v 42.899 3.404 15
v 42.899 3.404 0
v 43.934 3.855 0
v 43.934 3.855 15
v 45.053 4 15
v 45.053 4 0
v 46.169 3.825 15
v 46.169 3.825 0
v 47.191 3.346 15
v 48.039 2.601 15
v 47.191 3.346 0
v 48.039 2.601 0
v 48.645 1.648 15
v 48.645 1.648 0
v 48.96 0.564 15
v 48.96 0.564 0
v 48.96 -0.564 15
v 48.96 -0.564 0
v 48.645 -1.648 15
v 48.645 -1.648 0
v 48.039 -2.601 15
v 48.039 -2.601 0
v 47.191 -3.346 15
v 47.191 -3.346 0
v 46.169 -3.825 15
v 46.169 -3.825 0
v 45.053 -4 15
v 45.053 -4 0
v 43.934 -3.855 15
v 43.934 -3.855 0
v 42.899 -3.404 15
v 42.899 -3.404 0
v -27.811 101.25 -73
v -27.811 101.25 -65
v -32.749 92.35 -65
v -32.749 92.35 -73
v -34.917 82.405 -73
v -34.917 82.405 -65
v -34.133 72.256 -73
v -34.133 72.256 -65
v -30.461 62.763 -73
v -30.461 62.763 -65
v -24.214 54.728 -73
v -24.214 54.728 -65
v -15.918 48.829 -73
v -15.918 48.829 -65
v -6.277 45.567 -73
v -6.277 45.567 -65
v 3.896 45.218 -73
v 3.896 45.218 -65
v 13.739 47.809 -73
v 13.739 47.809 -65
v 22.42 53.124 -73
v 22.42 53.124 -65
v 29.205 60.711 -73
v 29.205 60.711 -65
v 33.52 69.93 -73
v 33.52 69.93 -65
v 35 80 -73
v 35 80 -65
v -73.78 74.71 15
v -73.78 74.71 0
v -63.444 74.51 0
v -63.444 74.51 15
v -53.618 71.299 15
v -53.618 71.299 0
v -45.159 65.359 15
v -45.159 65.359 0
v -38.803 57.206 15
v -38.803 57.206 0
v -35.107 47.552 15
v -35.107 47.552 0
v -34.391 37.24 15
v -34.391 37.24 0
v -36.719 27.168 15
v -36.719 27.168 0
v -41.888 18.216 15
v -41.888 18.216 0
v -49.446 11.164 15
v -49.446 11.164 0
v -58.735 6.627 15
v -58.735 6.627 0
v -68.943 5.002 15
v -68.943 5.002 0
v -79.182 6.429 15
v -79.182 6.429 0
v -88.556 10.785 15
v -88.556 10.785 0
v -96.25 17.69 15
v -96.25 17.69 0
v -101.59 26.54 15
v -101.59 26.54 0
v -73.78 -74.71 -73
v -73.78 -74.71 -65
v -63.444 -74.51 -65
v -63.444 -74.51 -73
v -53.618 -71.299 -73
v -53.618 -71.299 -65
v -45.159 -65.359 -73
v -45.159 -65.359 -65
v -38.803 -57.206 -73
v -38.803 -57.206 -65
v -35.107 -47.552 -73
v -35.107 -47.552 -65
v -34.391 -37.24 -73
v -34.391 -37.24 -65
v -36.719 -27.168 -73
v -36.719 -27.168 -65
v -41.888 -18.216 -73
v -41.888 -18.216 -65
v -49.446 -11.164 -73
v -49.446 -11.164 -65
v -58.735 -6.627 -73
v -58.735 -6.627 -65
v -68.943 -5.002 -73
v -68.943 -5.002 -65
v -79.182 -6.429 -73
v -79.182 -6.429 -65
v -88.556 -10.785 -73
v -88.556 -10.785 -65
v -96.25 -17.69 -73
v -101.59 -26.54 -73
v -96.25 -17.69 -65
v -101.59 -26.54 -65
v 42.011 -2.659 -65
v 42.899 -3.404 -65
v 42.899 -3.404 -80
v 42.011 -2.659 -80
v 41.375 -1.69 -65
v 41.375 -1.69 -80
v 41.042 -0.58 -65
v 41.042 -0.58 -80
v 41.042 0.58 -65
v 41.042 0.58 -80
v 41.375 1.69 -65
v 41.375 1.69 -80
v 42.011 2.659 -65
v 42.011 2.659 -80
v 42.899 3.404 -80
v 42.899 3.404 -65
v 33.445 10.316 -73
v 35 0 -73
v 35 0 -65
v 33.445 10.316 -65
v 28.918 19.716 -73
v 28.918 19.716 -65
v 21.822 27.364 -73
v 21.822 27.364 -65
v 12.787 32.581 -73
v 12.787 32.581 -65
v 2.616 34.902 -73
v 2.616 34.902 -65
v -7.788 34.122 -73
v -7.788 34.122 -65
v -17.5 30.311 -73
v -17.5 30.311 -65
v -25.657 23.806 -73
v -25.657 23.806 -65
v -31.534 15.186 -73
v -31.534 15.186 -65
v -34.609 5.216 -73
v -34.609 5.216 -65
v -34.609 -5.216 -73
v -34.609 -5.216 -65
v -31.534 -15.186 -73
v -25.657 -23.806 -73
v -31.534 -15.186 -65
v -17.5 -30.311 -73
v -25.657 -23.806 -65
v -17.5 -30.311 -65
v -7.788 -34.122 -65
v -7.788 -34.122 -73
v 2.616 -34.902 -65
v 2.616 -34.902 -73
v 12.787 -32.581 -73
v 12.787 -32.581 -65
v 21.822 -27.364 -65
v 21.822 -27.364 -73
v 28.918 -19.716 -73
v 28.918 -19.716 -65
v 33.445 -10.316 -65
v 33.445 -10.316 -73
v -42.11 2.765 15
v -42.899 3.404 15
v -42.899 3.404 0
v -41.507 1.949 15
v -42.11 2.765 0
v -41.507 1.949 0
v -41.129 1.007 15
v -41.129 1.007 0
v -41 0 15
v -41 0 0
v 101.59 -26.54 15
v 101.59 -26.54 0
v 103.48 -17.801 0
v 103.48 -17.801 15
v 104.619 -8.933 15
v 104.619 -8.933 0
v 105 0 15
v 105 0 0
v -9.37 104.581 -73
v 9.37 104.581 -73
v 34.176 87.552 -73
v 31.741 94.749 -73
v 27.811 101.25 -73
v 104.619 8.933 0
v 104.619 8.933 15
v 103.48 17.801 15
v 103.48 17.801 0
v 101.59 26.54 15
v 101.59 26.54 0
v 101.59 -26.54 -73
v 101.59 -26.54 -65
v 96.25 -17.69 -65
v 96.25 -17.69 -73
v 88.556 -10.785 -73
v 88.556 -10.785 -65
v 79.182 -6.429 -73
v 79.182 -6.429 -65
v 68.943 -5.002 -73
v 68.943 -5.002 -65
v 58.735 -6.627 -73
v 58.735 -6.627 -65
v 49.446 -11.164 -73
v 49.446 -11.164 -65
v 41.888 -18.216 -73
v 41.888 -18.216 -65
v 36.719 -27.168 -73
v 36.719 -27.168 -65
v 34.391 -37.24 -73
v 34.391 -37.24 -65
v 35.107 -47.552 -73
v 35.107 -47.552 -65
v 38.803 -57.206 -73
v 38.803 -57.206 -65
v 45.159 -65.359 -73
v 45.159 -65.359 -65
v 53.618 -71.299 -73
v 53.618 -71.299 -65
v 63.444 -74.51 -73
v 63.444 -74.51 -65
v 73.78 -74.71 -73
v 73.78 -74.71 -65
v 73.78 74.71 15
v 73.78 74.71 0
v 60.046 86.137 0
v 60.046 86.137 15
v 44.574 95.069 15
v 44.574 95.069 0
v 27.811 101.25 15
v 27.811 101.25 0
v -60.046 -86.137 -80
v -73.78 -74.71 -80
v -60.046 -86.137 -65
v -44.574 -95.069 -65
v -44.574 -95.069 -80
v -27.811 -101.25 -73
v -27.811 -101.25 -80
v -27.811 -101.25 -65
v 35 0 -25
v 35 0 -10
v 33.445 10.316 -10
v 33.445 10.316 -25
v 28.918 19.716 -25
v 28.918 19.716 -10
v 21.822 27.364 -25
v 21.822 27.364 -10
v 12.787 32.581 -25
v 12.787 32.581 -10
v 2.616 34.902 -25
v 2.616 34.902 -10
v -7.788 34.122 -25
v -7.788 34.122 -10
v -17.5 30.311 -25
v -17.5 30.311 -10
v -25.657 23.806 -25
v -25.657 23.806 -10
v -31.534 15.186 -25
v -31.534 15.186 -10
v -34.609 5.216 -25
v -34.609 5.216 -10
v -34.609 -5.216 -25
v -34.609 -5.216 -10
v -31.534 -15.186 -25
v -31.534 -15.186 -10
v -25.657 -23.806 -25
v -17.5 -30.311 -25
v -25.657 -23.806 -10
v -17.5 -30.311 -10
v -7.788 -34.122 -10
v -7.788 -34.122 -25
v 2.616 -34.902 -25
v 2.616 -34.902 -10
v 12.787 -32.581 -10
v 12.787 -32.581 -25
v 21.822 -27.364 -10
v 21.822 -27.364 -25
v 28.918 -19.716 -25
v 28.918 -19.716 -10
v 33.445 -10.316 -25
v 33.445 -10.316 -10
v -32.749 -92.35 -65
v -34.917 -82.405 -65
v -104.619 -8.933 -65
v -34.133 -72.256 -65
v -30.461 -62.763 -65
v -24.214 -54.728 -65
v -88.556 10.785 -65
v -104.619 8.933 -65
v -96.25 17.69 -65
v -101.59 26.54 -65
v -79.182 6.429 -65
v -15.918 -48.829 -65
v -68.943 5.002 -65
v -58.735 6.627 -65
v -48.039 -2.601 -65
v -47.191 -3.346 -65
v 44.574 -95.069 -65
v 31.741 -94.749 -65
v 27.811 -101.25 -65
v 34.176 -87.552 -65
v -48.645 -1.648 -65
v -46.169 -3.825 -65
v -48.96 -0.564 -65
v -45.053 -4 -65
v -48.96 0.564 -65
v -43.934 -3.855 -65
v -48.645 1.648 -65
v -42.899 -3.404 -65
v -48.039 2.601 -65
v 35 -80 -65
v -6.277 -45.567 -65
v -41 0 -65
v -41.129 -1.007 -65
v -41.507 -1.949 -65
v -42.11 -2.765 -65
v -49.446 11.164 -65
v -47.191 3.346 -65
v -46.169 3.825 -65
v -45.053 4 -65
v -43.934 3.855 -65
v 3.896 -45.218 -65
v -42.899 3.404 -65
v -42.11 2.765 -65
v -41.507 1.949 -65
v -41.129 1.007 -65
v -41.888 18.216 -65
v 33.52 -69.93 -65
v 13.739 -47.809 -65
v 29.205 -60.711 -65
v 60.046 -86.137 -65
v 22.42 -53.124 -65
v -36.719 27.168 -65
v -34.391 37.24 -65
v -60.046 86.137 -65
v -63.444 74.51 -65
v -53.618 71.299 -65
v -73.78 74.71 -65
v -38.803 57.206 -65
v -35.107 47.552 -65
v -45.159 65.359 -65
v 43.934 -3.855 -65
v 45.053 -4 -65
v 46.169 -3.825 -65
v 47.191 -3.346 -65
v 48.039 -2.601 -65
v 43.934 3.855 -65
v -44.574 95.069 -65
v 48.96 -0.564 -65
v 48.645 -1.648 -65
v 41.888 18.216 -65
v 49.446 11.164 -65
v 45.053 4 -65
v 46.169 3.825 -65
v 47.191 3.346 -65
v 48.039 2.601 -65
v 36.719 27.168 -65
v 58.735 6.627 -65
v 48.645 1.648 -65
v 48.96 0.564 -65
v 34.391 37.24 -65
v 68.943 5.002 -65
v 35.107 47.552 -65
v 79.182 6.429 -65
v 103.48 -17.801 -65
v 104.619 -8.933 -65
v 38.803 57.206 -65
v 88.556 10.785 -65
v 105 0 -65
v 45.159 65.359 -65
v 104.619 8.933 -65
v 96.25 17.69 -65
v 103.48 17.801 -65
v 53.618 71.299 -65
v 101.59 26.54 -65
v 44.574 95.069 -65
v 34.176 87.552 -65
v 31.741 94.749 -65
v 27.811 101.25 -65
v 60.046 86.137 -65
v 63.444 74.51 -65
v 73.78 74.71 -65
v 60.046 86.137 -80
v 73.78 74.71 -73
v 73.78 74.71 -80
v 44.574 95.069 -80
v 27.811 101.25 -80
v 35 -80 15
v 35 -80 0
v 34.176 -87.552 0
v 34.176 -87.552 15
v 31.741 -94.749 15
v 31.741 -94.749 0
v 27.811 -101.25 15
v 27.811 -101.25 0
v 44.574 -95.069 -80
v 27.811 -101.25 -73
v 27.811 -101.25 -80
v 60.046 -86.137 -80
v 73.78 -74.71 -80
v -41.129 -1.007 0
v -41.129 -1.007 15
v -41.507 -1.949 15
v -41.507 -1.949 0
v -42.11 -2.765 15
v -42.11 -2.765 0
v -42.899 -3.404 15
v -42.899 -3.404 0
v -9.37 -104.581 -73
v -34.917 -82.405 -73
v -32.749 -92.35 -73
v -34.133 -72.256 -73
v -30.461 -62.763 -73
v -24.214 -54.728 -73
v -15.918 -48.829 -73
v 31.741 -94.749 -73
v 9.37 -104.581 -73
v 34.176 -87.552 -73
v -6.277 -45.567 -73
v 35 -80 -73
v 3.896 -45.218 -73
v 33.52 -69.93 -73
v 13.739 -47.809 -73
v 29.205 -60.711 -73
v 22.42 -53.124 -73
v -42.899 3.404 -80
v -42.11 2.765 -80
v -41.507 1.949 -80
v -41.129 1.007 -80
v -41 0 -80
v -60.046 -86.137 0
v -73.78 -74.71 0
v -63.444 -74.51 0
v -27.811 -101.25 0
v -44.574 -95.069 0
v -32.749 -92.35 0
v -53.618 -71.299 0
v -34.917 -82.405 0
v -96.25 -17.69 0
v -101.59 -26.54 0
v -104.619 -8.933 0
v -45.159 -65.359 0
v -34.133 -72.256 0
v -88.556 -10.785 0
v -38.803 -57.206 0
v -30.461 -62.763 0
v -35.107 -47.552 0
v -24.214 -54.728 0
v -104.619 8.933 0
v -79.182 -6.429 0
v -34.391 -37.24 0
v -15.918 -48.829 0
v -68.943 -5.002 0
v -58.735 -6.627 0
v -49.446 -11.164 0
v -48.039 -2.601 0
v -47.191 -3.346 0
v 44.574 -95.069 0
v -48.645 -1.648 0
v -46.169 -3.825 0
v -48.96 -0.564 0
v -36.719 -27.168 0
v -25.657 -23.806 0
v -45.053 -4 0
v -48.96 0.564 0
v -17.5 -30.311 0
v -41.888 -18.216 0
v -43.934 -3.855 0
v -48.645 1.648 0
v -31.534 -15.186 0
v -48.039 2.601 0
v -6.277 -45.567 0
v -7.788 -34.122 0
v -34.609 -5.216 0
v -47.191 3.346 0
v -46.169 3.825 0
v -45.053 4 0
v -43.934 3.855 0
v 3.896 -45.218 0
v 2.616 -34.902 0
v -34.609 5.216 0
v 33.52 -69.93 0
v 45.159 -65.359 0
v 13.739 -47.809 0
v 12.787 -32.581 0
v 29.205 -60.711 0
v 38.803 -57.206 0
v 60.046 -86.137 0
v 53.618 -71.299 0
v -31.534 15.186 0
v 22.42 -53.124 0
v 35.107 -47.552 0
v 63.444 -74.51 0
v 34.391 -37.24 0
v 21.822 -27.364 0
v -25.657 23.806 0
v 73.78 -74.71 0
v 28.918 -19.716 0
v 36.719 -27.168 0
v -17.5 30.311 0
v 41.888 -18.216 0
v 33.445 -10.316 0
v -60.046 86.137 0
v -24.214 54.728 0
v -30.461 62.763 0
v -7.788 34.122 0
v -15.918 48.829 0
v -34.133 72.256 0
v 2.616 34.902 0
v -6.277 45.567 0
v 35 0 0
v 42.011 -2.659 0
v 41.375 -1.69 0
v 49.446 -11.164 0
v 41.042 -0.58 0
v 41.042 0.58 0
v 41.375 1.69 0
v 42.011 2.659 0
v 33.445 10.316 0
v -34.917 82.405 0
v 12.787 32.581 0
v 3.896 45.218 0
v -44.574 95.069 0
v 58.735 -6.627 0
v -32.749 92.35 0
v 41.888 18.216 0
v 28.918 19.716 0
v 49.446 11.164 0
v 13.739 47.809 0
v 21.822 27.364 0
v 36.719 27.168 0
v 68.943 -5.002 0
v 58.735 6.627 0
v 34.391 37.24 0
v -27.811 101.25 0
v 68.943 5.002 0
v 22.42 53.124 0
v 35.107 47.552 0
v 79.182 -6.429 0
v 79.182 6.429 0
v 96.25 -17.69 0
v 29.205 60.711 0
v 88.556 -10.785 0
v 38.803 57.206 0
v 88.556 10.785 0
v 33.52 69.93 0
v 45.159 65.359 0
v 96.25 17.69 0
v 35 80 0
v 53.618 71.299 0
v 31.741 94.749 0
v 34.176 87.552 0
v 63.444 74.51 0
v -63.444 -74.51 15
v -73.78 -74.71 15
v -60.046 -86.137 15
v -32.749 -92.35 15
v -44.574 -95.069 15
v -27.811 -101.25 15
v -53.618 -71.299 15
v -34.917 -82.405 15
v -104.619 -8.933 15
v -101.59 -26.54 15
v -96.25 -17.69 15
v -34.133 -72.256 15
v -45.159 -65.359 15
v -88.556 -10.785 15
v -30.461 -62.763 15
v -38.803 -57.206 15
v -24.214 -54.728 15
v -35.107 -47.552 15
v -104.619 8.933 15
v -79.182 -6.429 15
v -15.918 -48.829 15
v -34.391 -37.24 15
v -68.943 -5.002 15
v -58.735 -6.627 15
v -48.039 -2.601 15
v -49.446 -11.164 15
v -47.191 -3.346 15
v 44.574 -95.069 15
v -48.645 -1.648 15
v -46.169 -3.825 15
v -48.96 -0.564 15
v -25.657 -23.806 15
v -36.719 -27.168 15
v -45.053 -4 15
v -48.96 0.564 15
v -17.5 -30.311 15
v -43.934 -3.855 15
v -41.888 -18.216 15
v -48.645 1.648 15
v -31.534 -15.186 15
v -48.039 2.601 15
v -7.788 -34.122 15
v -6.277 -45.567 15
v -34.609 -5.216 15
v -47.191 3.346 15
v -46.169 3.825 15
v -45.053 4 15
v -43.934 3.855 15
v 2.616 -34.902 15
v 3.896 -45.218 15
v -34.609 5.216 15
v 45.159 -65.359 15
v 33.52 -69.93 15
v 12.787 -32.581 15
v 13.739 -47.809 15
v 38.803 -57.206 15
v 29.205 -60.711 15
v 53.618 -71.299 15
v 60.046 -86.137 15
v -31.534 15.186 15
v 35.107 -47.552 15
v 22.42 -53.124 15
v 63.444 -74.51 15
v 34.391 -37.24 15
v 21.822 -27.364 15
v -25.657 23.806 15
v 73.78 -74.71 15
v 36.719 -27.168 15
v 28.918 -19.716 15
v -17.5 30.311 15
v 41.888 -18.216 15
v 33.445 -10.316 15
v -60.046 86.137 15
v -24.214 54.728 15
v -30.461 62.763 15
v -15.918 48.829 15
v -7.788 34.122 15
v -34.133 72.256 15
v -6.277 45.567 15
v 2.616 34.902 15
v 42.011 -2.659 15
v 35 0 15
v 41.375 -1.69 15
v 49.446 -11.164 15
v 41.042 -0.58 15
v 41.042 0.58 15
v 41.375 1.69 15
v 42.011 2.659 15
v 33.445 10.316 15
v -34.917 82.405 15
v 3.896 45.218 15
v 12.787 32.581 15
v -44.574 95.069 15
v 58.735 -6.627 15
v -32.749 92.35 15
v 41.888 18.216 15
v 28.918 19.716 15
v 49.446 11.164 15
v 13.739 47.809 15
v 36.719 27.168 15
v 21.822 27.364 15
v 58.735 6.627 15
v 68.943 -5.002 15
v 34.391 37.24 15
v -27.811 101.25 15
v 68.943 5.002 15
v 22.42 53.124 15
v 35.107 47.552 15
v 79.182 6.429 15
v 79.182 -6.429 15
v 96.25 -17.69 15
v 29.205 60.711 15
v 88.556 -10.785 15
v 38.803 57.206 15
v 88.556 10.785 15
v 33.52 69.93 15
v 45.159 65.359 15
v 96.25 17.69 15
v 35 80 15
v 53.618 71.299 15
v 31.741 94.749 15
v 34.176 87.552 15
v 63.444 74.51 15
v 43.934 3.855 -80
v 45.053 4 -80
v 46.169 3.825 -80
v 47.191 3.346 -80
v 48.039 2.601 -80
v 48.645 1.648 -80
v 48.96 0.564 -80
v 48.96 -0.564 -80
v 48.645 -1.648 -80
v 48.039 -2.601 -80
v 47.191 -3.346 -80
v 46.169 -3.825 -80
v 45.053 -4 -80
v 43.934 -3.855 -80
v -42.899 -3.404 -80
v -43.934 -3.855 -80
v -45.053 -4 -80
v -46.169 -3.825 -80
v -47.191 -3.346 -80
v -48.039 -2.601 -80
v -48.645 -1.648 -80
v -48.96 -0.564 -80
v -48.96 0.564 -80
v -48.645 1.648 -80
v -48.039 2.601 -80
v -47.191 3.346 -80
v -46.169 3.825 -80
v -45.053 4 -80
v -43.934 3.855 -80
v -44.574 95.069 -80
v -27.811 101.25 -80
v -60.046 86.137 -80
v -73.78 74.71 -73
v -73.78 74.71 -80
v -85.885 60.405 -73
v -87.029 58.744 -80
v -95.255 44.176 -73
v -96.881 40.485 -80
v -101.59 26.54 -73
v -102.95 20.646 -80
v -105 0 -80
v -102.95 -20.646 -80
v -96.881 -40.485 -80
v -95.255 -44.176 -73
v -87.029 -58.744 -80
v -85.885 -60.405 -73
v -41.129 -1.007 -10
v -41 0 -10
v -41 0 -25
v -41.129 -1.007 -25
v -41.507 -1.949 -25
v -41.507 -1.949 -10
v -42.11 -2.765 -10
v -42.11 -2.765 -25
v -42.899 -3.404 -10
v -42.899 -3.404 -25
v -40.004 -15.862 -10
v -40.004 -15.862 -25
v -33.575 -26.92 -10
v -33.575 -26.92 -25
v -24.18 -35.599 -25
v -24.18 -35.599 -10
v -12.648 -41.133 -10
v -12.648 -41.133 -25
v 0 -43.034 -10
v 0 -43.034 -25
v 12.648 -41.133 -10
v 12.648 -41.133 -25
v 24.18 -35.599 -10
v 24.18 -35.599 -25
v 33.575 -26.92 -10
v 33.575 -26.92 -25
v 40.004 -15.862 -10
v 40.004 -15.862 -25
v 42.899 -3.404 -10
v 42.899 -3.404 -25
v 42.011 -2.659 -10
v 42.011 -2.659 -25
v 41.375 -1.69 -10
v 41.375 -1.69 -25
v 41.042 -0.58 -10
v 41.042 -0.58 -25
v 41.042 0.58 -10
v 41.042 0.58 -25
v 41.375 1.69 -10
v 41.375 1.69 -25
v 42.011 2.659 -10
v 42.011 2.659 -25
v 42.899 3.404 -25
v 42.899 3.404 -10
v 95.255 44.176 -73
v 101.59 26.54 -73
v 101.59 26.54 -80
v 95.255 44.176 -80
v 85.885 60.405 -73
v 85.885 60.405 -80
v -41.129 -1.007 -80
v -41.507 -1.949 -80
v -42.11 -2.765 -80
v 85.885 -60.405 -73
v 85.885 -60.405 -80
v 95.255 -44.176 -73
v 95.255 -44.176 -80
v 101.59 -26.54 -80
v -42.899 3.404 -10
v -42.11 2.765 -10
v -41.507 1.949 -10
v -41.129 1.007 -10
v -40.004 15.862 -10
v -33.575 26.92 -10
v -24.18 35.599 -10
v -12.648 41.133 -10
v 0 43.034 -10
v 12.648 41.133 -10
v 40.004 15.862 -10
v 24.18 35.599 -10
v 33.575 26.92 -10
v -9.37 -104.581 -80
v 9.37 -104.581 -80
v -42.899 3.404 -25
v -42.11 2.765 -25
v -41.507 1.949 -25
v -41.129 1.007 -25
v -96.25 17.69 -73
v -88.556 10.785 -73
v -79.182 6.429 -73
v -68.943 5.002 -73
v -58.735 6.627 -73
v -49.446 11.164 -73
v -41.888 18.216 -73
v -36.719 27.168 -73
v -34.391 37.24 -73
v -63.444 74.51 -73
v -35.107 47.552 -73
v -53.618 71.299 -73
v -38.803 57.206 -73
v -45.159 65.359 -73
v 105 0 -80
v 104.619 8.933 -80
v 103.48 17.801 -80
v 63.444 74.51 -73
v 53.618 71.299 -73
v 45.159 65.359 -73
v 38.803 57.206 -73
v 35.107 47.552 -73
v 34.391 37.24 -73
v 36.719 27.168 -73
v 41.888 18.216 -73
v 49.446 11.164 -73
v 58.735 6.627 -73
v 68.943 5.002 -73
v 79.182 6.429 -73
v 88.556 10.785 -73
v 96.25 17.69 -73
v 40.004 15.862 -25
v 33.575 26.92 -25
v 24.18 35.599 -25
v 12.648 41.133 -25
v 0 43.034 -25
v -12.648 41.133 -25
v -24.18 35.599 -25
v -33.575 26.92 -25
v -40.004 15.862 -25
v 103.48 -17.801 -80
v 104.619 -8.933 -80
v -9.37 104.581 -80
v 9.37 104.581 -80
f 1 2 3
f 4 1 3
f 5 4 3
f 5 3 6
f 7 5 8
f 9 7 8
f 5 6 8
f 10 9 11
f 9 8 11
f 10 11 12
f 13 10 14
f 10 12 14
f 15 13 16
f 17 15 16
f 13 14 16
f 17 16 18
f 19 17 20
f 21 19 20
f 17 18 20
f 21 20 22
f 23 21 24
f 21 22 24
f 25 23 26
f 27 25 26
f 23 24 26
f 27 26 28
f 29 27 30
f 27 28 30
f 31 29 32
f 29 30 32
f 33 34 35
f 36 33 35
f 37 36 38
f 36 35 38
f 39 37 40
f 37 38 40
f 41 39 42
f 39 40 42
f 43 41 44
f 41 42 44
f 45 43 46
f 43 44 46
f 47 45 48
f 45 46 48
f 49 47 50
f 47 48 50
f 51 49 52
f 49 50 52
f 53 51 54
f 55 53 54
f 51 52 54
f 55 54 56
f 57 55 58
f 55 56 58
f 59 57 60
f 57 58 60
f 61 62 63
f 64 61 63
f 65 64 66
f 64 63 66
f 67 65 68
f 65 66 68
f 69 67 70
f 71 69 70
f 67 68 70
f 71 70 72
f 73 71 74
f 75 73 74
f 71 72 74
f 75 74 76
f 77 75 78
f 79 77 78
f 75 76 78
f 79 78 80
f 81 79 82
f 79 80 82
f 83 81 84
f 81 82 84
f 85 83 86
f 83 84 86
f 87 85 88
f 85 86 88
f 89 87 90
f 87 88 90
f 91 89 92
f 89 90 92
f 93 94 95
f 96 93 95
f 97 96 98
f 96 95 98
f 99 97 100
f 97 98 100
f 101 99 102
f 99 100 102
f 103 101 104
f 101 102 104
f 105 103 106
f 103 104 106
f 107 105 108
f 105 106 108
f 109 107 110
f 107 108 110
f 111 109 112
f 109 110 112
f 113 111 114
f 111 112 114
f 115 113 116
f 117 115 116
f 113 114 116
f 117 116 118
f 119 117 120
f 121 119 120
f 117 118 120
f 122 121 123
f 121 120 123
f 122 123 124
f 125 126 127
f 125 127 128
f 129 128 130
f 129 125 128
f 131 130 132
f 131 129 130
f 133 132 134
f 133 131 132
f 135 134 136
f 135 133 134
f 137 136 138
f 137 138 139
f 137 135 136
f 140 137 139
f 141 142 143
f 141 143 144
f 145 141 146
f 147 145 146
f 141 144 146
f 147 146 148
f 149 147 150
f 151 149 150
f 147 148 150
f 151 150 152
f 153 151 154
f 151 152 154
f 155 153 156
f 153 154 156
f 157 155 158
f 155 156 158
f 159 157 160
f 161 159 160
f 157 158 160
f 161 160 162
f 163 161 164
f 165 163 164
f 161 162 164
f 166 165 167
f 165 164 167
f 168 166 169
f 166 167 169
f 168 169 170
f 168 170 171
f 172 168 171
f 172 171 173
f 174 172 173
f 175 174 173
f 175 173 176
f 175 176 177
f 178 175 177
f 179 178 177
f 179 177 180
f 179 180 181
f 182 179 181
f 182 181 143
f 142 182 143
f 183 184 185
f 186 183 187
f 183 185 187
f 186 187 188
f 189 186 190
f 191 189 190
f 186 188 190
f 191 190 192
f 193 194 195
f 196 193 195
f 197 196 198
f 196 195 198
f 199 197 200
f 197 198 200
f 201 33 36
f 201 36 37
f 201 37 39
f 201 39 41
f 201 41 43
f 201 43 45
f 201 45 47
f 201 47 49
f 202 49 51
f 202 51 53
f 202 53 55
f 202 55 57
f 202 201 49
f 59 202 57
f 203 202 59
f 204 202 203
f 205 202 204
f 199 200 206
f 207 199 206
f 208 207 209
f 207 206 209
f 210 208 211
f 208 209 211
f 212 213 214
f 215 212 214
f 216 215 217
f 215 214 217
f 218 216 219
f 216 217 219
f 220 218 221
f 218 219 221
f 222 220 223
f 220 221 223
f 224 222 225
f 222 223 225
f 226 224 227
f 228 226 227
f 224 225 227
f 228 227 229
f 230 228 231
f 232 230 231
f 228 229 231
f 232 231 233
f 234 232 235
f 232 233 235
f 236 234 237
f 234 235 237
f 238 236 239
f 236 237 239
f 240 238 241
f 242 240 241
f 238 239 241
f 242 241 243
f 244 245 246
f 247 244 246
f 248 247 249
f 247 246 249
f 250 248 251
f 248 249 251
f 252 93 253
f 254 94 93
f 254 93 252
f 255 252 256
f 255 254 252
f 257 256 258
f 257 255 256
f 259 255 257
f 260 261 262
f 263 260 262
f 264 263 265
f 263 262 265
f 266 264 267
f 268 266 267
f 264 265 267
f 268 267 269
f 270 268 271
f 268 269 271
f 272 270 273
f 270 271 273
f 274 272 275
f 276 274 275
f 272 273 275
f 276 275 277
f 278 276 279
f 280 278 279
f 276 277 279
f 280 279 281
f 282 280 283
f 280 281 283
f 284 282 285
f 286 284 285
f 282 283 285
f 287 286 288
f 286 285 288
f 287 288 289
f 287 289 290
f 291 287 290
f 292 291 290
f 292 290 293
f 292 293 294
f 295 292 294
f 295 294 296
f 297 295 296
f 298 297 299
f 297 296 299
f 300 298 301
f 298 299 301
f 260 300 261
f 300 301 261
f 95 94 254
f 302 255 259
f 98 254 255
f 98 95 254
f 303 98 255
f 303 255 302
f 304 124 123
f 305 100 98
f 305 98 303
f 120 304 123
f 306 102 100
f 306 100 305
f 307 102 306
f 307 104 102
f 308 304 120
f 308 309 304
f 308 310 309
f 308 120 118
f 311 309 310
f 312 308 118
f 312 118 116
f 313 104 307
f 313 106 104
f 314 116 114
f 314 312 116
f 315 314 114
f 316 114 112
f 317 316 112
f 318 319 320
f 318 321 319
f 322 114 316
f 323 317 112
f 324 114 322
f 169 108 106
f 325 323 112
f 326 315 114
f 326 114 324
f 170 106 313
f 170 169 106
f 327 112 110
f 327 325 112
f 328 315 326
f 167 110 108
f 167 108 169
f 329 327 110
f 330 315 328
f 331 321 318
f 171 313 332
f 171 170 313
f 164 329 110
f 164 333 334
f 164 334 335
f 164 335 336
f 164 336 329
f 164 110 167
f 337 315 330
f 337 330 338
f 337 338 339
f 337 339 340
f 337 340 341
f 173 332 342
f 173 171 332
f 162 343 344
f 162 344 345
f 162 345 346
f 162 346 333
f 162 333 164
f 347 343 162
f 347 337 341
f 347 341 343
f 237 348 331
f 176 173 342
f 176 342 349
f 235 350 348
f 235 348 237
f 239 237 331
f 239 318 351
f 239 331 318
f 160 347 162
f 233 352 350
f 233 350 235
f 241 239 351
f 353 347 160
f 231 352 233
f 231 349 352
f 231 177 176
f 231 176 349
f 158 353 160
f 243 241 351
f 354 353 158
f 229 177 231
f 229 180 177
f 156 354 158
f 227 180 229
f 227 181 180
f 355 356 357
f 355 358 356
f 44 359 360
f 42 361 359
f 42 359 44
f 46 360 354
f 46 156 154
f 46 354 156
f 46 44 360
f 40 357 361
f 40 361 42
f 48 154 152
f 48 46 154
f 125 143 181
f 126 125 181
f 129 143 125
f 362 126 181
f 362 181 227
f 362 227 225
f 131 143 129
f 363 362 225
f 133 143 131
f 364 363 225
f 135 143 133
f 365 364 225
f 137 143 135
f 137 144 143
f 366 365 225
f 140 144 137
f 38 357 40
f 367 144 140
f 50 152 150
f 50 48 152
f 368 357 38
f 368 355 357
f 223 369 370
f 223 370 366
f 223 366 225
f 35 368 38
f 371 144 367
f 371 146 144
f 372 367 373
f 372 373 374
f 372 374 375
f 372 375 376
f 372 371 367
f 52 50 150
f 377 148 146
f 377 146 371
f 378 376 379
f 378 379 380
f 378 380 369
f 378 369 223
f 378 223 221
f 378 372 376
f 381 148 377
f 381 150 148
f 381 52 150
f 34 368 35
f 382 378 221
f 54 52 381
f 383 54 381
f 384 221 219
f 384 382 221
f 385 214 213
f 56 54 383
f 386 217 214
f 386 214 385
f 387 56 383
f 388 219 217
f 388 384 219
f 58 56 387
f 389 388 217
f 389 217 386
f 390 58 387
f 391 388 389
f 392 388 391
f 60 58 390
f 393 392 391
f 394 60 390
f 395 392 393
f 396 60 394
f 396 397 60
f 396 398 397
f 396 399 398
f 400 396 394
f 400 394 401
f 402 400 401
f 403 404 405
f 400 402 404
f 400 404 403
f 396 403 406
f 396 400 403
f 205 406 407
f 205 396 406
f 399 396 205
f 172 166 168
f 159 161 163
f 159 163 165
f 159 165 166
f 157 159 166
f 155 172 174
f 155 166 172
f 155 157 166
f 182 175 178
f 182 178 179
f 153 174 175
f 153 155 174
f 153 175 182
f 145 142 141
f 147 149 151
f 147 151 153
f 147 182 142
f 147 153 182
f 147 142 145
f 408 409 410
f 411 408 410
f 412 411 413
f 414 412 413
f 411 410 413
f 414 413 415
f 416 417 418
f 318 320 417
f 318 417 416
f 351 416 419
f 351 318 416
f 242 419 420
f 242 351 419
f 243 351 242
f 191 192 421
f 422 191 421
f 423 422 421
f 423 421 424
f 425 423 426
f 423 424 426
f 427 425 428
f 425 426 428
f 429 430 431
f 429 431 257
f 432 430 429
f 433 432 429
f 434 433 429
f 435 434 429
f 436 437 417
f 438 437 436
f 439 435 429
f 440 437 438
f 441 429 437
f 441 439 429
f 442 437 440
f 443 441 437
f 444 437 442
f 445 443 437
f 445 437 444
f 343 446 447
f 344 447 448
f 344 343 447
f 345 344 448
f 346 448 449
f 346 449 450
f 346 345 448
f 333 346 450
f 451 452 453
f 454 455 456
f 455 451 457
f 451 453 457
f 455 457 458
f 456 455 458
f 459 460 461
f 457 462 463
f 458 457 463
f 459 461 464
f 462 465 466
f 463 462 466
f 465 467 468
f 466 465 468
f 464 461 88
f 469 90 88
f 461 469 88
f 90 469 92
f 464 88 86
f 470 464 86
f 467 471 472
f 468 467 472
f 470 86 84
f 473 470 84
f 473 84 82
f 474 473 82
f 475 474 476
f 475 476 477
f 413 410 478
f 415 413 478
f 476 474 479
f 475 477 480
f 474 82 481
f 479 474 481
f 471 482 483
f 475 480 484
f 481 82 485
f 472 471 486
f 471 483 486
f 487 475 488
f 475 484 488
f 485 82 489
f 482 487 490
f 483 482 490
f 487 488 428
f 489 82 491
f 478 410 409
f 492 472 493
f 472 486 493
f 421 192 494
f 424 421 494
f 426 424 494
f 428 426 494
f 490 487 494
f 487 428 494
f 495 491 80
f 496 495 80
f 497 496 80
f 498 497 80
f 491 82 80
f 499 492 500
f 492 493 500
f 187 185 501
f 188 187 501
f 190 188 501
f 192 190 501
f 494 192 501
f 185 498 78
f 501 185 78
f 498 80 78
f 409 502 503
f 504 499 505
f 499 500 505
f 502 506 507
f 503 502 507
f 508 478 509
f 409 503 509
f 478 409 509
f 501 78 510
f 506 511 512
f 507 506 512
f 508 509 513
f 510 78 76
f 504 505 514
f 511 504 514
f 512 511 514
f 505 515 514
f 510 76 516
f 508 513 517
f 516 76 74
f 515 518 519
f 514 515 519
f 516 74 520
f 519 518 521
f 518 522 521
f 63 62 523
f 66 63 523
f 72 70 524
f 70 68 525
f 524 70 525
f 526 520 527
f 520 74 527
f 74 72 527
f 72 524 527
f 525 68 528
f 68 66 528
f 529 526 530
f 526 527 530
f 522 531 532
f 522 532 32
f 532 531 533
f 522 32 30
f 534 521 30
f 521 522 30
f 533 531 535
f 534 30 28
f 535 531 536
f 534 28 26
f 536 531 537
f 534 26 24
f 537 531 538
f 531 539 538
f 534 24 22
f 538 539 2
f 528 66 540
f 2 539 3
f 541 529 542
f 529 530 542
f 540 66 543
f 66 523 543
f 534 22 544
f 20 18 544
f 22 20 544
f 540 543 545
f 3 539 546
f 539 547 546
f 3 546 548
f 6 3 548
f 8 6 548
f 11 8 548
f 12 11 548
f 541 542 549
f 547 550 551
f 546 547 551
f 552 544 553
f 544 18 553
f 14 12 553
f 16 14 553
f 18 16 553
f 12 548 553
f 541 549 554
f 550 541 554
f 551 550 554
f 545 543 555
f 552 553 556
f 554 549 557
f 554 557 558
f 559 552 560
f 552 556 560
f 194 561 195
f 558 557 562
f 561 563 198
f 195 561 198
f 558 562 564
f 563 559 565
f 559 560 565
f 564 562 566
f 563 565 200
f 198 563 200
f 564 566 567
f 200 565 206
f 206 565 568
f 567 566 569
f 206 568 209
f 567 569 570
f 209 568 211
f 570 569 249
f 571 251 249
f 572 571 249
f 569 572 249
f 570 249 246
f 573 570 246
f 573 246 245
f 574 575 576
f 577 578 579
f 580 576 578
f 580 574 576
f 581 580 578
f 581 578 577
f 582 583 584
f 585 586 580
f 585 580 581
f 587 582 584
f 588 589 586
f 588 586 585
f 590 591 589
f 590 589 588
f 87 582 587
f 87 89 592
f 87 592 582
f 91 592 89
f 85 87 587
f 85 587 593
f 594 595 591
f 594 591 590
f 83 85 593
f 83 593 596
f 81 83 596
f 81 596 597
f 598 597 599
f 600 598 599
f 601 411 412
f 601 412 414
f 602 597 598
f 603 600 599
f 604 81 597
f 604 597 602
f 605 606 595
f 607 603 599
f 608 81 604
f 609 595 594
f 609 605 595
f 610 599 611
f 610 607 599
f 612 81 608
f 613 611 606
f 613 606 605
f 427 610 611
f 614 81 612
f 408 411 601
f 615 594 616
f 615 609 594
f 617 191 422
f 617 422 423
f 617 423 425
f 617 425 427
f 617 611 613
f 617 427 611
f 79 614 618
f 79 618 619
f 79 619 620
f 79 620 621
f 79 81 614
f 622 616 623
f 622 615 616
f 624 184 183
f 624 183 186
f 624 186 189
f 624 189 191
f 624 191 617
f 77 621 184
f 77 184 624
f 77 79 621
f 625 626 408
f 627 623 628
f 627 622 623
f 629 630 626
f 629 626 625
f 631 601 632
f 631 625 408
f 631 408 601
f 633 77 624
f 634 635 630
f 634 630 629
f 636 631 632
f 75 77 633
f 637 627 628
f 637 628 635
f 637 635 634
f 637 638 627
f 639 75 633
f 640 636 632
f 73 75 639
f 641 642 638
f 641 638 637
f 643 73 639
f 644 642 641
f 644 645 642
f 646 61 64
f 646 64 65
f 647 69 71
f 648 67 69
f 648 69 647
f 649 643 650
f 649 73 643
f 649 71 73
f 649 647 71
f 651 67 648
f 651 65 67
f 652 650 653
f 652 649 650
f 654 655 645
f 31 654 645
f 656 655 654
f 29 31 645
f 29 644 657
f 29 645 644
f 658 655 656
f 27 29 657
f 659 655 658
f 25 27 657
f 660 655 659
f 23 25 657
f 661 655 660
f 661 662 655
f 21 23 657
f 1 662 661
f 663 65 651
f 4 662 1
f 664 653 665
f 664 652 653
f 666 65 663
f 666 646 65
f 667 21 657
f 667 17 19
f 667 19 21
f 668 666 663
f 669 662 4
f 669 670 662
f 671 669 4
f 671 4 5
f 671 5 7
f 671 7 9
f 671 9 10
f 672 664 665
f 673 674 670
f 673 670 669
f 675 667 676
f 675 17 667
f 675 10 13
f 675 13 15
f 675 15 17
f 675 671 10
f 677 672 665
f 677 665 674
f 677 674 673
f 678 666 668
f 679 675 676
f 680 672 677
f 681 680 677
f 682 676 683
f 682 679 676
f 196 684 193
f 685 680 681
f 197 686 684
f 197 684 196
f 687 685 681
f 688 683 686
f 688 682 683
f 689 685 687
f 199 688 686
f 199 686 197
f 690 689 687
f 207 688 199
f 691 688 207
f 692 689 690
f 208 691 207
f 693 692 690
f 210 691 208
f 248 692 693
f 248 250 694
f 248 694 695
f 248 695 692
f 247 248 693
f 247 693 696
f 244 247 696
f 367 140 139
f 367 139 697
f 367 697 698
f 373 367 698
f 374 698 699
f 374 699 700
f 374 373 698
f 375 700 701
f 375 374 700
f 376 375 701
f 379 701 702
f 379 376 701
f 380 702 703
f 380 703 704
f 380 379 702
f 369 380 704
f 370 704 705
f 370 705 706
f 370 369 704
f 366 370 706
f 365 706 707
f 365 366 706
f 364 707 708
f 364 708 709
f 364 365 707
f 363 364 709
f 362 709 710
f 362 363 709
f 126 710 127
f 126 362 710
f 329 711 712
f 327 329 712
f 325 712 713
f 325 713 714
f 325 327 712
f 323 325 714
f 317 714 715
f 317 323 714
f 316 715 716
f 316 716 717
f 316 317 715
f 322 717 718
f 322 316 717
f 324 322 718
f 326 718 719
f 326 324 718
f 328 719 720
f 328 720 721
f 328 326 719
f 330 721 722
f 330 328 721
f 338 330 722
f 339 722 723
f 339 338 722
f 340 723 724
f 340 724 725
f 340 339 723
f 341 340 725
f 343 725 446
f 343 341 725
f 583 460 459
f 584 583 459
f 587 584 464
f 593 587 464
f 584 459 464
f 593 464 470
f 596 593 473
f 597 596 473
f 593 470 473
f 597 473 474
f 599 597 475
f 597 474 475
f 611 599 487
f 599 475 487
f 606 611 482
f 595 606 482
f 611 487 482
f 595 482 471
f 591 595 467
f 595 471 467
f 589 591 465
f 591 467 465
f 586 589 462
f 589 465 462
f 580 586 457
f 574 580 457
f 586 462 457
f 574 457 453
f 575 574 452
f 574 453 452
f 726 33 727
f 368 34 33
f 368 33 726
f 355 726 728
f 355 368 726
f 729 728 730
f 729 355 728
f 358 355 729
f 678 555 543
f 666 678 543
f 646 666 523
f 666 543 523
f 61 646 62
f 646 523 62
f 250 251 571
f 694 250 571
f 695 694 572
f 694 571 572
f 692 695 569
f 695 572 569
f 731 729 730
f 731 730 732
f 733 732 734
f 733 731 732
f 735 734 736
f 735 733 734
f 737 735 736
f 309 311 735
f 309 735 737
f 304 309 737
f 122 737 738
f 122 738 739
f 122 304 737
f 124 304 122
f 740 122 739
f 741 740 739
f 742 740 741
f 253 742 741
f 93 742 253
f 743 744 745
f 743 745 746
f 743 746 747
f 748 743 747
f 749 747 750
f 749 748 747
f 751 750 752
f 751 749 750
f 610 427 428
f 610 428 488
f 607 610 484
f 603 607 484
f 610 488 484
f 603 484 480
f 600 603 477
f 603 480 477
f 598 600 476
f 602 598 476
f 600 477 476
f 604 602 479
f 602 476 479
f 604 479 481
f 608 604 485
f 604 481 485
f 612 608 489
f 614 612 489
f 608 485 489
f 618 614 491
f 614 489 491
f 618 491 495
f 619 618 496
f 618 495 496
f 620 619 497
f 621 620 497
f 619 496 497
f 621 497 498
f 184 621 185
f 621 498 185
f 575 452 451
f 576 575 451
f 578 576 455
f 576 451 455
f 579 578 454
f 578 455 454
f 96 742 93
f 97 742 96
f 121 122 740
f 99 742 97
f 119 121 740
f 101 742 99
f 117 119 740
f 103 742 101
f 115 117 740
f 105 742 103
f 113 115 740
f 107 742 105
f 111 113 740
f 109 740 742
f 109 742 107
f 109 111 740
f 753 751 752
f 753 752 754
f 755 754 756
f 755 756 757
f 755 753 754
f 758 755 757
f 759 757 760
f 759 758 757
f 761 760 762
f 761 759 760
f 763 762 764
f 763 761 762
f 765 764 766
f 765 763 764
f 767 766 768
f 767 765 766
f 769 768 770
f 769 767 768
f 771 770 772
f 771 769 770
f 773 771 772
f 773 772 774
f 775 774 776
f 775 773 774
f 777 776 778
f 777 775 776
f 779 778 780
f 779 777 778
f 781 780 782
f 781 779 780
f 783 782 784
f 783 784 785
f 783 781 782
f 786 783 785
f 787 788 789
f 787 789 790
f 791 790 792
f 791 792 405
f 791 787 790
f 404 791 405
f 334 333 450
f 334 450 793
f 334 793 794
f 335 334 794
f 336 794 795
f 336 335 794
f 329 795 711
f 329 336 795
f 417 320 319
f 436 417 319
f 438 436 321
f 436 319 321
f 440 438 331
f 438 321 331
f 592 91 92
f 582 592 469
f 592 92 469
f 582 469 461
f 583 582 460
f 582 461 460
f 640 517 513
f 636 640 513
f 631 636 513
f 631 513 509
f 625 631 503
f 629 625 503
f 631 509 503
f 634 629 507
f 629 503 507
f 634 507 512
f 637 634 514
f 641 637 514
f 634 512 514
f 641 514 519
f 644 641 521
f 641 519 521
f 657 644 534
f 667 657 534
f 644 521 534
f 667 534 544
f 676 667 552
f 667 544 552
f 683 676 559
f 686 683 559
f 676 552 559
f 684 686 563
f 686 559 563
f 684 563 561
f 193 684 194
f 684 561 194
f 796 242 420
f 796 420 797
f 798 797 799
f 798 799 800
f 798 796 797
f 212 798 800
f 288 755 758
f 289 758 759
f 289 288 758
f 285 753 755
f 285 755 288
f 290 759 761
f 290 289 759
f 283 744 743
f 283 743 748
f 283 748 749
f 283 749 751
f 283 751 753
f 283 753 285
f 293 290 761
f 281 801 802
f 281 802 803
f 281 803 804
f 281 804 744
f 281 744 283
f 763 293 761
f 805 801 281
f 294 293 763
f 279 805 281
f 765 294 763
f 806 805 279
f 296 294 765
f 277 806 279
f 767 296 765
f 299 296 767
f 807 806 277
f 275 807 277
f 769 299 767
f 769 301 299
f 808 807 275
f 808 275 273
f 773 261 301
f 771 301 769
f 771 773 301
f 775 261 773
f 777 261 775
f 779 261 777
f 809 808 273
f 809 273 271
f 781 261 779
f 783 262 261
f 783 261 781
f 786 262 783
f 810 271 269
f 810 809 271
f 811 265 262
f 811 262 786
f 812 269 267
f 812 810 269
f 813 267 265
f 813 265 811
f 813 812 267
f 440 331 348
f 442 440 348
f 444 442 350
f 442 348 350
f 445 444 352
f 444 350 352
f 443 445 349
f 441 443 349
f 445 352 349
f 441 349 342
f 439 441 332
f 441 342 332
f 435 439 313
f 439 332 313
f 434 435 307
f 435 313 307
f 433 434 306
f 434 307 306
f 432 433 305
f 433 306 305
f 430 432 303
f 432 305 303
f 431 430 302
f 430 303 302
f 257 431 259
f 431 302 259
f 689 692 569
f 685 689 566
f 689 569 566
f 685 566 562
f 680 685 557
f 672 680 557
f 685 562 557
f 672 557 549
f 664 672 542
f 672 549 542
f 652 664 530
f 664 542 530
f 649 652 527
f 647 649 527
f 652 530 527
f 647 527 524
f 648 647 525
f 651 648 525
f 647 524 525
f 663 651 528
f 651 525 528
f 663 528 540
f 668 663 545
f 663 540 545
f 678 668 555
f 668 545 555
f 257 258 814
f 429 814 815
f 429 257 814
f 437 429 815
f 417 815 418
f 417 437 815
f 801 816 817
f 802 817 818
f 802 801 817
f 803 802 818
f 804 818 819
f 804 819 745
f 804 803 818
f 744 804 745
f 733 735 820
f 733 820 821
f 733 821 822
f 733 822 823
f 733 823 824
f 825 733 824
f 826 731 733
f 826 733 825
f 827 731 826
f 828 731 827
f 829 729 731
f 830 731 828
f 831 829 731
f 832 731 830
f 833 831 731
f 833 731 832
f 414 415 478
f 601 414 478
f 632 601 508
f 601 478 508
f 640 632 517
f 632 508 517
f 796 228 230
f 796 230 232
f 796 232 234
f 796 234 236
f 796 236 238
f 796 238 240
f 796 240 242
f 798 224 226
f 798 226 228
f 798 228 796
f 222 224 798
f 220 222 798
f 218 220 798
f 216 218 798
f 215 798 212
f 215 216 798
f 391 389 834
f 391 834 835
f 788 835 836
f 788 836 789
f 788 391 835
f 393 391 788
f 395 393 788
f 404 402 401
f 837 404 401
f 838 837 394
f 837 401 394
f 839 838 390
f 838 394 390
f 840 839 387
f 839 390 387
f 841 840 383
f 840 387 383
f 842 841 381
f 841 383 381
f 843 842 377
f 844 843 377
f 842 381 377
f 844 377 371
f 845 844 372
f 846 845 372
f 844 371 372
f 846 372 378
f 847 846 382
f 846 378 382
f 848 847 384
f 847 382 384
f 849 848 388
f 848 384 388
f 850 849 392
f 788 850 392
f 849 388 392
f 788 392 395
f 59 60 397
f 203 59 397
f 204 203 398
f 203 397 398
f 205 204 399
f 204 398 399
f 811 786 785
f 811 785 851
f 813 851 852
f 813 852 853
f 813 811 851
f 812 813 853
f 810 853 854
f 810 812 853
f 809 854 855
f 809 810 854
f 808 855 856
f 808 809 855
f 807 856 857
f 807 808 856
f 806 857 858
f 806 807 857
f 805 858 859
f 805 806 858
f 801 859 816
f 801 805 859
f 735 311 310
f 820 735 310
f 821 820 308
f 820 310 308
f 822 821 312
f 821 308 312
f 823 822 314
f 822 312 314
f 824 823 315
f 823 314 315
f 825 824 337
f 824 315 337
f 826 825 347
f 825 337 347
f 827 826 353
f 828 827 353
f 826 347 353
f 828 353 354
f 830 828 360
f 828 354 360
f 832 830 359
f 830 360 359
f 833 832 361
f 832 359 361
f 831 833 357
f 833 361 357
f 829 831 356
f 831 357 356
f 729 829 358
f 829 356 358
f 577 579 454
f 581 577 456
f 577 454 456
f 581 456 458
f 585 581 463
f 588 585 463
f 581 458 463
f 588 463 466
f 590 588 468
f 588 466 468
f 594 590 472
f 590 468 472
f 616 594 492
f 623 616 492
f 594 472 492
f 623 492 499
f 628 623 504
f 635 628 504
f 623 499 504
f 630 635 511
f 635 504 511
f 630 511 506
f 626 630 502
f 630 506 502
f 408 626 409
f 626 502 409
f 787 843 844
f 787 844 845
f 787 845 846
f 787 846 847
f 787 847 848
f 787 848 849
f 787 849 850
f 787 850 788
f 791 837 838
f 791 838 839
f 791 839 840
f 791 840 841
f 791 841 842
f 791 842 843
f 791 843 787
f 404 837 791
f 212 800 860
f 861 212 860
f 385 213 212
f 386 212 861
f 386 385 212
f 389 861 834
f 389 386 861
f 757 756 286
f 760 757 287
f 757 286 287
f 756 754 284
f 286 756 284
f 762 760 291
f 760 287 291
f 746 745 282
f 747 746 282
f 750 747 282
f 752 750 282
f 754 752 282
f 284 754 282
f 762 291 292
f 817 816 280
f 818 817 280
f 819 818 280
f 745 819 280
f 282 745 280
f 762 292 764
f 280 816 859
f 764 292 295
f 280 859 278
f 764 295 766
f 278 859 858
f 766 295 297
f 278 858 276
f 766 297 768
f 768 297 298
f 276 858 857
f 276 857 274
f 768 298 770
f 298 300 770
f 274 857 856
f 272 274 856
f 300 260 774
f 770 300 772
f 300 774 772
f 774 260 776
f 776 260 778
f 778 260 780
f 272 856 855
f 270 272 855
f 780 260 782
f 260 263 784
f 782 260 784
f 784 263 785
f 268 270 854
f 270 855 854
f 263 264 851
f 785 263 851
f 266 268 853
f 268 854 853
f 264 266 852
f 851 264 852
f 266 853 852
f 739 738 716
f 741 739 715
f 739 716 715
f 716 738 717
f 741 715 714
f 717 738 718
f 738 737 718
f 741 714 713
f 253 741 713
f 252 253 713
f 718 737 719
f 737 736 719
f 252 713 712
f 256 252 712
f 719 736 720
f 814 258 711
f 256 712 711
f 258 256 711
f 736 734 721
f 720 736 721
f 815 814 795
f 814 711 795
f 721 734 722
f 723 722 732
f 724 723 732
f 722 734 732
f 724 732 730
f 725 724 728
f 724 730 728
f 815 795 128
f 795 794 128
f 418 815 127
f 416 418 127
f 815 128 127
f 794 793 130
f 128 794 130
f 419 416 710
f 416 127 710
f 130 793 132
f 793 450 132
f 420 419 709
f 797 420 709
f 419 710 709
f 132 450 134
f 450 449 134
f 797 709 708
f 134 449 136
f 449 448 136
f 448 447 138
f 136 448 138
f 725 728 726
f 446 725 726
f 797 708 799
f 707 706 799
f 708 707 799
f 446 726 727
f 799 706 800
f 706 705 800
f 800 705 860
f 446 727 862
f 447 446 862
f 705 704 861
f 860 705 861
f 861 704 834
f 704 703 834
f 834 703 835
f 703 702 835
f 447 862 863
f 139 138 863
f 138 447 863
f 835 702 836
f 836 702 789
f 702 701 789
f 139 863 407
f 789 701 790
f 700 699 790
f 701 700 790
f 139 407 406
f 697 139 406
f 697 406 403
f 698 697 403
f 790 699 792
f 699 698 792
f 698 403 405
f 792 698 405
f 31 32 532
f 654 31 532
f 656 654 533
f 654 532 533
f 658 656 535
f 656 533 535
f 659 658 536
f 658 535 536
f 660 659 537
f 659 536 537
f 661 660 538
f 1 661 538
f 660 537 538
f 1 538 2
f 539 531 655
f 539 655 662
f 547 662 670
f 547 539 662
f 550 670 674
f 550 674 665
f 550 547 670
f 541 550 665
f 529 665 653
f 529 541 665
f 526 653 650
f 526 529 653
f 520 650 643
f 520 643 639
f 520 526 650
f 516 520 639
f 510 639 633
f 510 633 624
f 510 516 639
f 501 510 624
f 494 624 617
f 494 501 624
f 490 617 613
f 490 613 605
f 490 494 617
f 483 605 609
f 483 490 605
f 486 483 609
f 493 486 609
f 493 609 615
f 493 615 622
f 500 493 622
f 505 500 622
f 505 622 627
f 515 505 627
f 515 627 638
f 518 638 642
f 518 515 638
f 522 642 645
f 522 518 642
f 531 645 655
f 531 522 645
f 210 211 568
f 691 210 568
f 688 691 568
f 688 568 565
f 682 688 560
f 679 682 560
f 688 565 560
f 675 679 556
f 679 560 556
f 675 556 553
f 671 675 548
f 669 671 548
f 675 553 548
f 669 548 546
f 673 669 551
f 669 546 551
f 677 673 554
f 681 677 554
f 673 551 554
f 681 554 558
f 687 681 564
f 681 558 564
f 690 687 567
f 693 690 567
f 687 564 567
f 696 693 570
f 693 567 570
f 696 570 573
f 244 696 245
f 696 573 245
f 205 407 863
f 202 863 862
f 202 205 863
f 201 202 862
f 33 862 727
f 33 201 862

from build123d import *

# Parameters (mm, degrees)
F0_R     = 35
F1_DEPTH = 15
F2_START = -65
F2_DEPTH = 15
F3_DEPTH = 73
F4_START = -10
F4_DEPTH = 15


with BuildPart() as f1:
    # F0 (on Top) → F1 (new body)
    with BuildSketch(Plane.XY):
        with BuildLine():
            ThreePointArc((-27.8107443266, -101.25), (-11.2165937024, -46.8459953291), (35, -80))
            ThreePointArc((35, -80), (33.1540046709, -91.2165937024), (27.8107443266, -101.25))
            ThreePointArc((27.8107443266, -101.25), (52.5, -90.9326673974), (73.7796999699, -74.709811085))
            ThreePointArc((73.7796999699, -74.709811085), (38.9711431703, -22.5), (101.5904442965, -26.540188915))
            ThreePointArc((101.5904442965, -26.540188915), (104.1441228566, -13.3791507367), (105, 0))
            ThreePointArc((105, 0), (104.1441228566, 13.3791507367), (101.5904442965, 26.540188915))
            ThreePointArc((101.5904442965, 26.540188915), (38.9711431703, 22.5), (73.7796999699, 74.709811085))
            ThreePointArc((73.7796999699, 74.709811085), (52.5, 90.9326673974), (27.8107443266, 101.25))
            ThreePointArc((27.8107443266, 101.25), (33.1540046709, 91.2165937024), (35, 80))
            ThreePointArc((35, 80), (-11.2165937024, 46.8459953291), (-27.8107443266, 101.25))
            ThreePointArc((-27.8107443266, 101.25), (-52.5, 90.9326673974), (-73.7796999699, 74.709811085))
            ThreePointArc((-73.7796999699, 74.709811085), (-46.1781188718, 66.2908574256), (-34.2820323028, 40))
            ThreePointArc((-34.2820323028, 40), (-62.4188850575, 5.6794928667), (-101.5904442965, 26.540188915))
            ThreePointArc((-101.5904442965, 26.540188915), (-105, 0), (-101.5904442965, -26.540188915))
            ThreePointArc((-101.5904442965, -26.540188915), (-62.4188850575, -5.6794928667), (-34.2820323028, -40))
            ThreePointArc((-34.2820323028, -40), (-46.1781188718, -66.2908574256), (-73.7796999699, -74.709811085))
            ThreePointArc((-73.7796999699, -74.709811085), (-52.5, -90.9326673974), (-27.8107443266, -101.25))
        make_face()
        with BuildLine():
            ThreePointArc((-42.8991397367, -3.403878105), (-49, 0), (-42.8991397367, 3.403878105))
            ThreePointArc((-42.8991397367, 3.403878105), (0, 43.0339700272), (42.8991397367, 3.403878105))
            ThreePointArc((42.8991397367, 3.403878105), (46.9489175132, 3.4930961233), (49, 0))
            ThreePointArc((49, 0), (46.9489175132, -3.4930961233), (42.8991397367, -3.403878105))
            ThreePointArc((42.8991397367, -3.403878105), (0, -43.0339700272), (-42.8991397367, -3.403878105))
        make_face(mode=Mode.SUBTRACT)
        with BuildLine():
            ThreePointArc((-42.8991397367, 3.403878105), (-41.5069038767, 1.9489175132), (-41, 0))
            ThreePointArc((-41, 0), (-41.5069038767, -1.9489175132), (-42.8991397367, -3.403878105))
            ThreePointArc((-42.8991397367, -3.403878105), (0, -43.0339700272), (42.8991397367, -3.403878105))
            ThreePointArc((42.8991397367, -3.403878105), (41, 0), (42.8991397367, 3.403878105))
            ThreePointArc((42.8991397367, 3.403878105), (0, 43.0339700272), (-42.8991397367, 3.403878105))
        make_face()
        Circle(F0_R, mode=Mode.SUBTRACT)
    extrude(amount=F1_DEPTH)


with BuildPart() as f2:
    # F0 (on Top) → F2 (new body)
    with BuildSketch(Plane.XY.offset(F2_START)):
        with BuildLine():
            ThreePointArc((27.8107443266, -101.25), (33.1540046709, -91.2165937024), (35, -80))
            ThreePointArc((35, -80), (-11.2165937024, -46.8459953291), (-27.8107443266, -101.25))
            ThreePointArc((-27.8107443266, -101.25), (0, -105), (27.8107443266, -101.25))
        make_face()
        with BuildLine():
            ThreePointArc((-27.8107443266, -101.25), (-11.2165937024, -46.8459953291), (35, -80))
            ThreePointArc((35, -80), (33.1540046709, -91.2165937024), (27.8107443266, -101.25))
            ThreePointArc((27.8107443266, -101.25), (52.5, -90.9326673974), (73.7796999699, -74.709811085))
            ThreePointArc((73.7796999699, -74.709811085), (38.9711431703, -22.5), (101.5904442965, -26.540188915))
            ThreePointArc((101.5904442965, -26.540188915), (104.1441228566, -13.3791507367), (105, 0))
            ThreePointArc((105, 0), (104.1441228566, 13.3791507367), (101.5904442965, 26.540188915))
            ThreePointArc((101.5904442965, 26.540188915), (38.9711431703, 22.5), (73.7796999699, 74.709811085))
            ThreePointArc((73.7796999699, 74.709811085), (52.5, 90.9326673974), (27.8107443266, 101.25))
            ThreePointArc((27.8107443266, 101.25), (33.1540046709, 91.2165937024), (35, 80))
            ThreePointArc((35, 80), (-11.2165937024, 46.8459953291), (-27.8107443266, 101.25))
            ThreePointArc((-27.8107443266, 101.25), (-52.5, 90.9326673974), (-73.7796999699, 74.709811085))
            ThreePointArc((-73.7796999699, 74.709811085), (-46.1781188718, 66.2908574256), (-34.2820323028, 40))
            ThreePointArc((-34.2820323028, 40), (-62.4188850575, 5.6794928667), (-101.5904442965, 26.540188915))
            ThreePointArc((-101.5904442965, 26.540188915), (-105, 0), (-101.5904442965, -26.540188915))
            ThreePointArc((-101.5904442965, -26.540188915), (-62.4188850575, -5.6794928667), (-34.2820323028, -40))
            ThreePointArc((-34.2820323028, -40), (-46.1781188718, -66.2908574256), (-73.7796999699, -74.709811085))
            ThreePointArc((-73.7796999699, -74.709811085), (-52.5, -90.9326673974), (-27.8107443266, -101.25))
        make_face()
        with BuildLine():
            ThreePointArc((-42.8991397367, -3.403878105), (-49, 0), (-42.8991397367, 3.403878105))
            ThreePointArc((-42.8991397367, 3.403878105), (0, 43.0339700272), (42.8991397367, 3.403878105))
            ThreePointArc((42.8991397367, 3.403878105), (46.9489175132, 3.4930961233), (49, 0))
            ThreePointArc((49, 0), (46.9489175132, -3.4930961233), (42.8991397367, -3.403878105))
            ThreePointArc((42.8991397367, -3.403878105), (0, -43.0339700272), (-42.8991397367, -3.403878105))
        make_face(mode=Mode.SUBTRACT)
        with BuildLine():
            ThreePointArc((-101.5904442965, -26.540188915), (-90.9326673974, -52.5), (-73.7796999699, -74.709811085))
            ThreePointArc((-73.7796999699, -74.709811085), (-46.1781188718, -66.2908574256), (-34.2820323028, -40))
            ThreePointArc((-34.2820323028, -40), (-62.4188850575, -5.6794928667), (-101.5904442965, -26.540188915))
        make_face()
        with BuildLine():
            ThreePointArc((101.5904442965, -26.540188915), (38.9711431703, -22.5), (73.7796999699, -74.709811085))
            ThreePointArc((73.7796999699, -74.709811085), (90.9326673974, -52.5), (101.5904442965, -26.540188915))
        make_face()
        with BuildLine():
            ThreePointArc((-73.7796999699, 74.709811085), (-90.9326673974, 52.5), (-101.5904442965, 26.540188915))
            ThreePointArc((-101.5904442965, 26.540188915), (-62.4188850575, 5.6794928667), (-34.2820323028, 40))
            ThreePointArc((-34.2820323028, 40), (-46.1781188718, 66.2908574256), (-73.7796999699, 74.709811085))
        make_face()
        with BuildLine():
            ThreePointArc((73.7796999699, 74.709811085), (38.9711431703, 22.5), (101.5904442965, 26.540188915))
            ThreePointArc((101.5904442965, 26.540188915), (90.9326673974, 52.5), (73.7796999699, 74.709811085))
        make_face()
        with BuildLine():
            ThreePointArc((27.8107443266, 101.25), (0, 105), (-27.8107443266, 101.25))
            ThreePointArc((-27.8107443266, 101.25), (-11.2165937024, 46.8459953291), (35, 80))
            ThreePointArc((35, 80), (33.1540046709, 91.2165937024), (27.8107443266, 101.25))
        make_face()
        with BuildLine():
            ThreePointArc((-42.8991397367, 3.403878105), (-41.5069038767, 1.9489175132), (-41, 0))
            ThreePointArc((-41, 0), (-41.5069038767, -1.9489175132), (-42.8991397367, -3.403878105))
            ThreePointArc((-42.8991397367, -3.403878105), (0, -43.0339700272), (42.8991397367, -3.403878105))
            ThreePointArc((42.8991397367, -3.403878105), (41, 0), (42.8991397367, 3.403878105))
            ThreePointArc((42.8991397367, 3.403878105), (0, 43.0339700272), (-42.8991397367, 3.403878105))
        make_face()
        Circle(F0_R, mode=Mode.SUBTRACT)
        Circle(F0_R)
    extrude(amount=-F2_DEPTH)

    # F0 (on Top) → F3 (cut)
    with BuildSketch(Plane.XY):
        with BuildLine():
            ThreePointArc((-101.5904442965, -26.540188915), (-90.9326673974, -52.5), (-73.7796999699, -74.709811085))
            ThreePointArc((-73.7796999699, -74.709811085), (-46.1781188718, -66.2908574256), (-34.2820323028, -40))
            ThreePointArc((-34.2820323028, -40), (-62.4188850575, -5.6794928667), (-101.5904442965, -26.540188915))
        make_face()
        with BuildLine():
            ThreePointArc((-73.7796999699, 74.709811085), (-90.9326673974, 52.5), (-101.5904442965, 26.540188915))
            ThreePointArc((-101.5904442965, 26.540188915), (-62.4188850575, 5.6794928667), (-34.2820323028, 40))
            ThreePointArc((-34.2820323028, 40), (-46.1781188718, 66.2908574256), (-73.7796999699, 74.709811085))
        make_face()
        with BuildLine():
            ThreePointArc((27.8107443266, 101.25), (0, 105), (-27.8107443266, 101.25))
            ThreePointArc((-27.8107443266, 101.25), (-11.2165937024, 46.8459953291), (35, 80))
            ThreePointArc((35, 80), (33.1540046709, 91.2165937024), (27.8107443266, 101.25))
        make_face()
        with BuildLine():
            ThreePointArc((73.7796999699, 74.709811085), (38.9711431703, 22.5), (101.5904442965, 26.540188915))
            ThreePointArc((101.5904442965, 26.540188915), (90.9326673974, 52.5), (73.7796999699, 74.709811085))
        make_face()
        with BuildLine():
            ThreePointArc((27.8107443266, -101.25), (33.1540046709, -91.2165937024), (35, -80))
            ThreePointArc((35, -80), (-11.2165937024, -46.8459953291), (-27.8107443266, -101.25))
            ThreePointArc((-27.8107443266, -101.25), (0, -105), (27.8107443266, -101.25))
        make_face()
        with BuildLine():
            ThreePointArc((101.5904442965, -26.540188915), (38.9711431703, -22.5), (73.7796999699, -74.709811085))
            ThreePointArc((73.7796999699, -74.709811085), (90.9326673974, -52.5), (101.5904442965, -26.540188915))
        make_face()
        Circle(F0_R)
    extrude(amount=-F3_DEPTH, mode=Mode.SUBTRACT)


with BuildPart() as f4:
    # F0 (on Top) → F4 (new body)
    with BuildSketch(Plane.XY.offset(F4_START)):
        with BuildLine():
            ThreePointArc((-42.8991397367, 3.403878105), (-41.5069038767, 1.9489175132), (-41, 0))
            ThreePointArc((-41, 0), (-41.5069038767, -1.9489175132), (-42.8991397367, -3.403878105))
            ThreePointArc((-42.8991397367, -3.403878105), (0, -43.0339700272), (42.8991397367, -3.403878105))
            ThreePointArc((42.8991397367, -3.403878105), (41, 0), (42.8991397367, 3.403878105))
            ThreePointArc((42.8991397367, 3.403878105), (0, 43.0339700272), (-42.8991397367, 3.403878105))
        make_face()
        Circle(F0_R, mode=Mode.SUBTRACT)
    extrude(amount=-F4_DEPTH)


solid = Compound([f1.part, f2.part, f4.part])
